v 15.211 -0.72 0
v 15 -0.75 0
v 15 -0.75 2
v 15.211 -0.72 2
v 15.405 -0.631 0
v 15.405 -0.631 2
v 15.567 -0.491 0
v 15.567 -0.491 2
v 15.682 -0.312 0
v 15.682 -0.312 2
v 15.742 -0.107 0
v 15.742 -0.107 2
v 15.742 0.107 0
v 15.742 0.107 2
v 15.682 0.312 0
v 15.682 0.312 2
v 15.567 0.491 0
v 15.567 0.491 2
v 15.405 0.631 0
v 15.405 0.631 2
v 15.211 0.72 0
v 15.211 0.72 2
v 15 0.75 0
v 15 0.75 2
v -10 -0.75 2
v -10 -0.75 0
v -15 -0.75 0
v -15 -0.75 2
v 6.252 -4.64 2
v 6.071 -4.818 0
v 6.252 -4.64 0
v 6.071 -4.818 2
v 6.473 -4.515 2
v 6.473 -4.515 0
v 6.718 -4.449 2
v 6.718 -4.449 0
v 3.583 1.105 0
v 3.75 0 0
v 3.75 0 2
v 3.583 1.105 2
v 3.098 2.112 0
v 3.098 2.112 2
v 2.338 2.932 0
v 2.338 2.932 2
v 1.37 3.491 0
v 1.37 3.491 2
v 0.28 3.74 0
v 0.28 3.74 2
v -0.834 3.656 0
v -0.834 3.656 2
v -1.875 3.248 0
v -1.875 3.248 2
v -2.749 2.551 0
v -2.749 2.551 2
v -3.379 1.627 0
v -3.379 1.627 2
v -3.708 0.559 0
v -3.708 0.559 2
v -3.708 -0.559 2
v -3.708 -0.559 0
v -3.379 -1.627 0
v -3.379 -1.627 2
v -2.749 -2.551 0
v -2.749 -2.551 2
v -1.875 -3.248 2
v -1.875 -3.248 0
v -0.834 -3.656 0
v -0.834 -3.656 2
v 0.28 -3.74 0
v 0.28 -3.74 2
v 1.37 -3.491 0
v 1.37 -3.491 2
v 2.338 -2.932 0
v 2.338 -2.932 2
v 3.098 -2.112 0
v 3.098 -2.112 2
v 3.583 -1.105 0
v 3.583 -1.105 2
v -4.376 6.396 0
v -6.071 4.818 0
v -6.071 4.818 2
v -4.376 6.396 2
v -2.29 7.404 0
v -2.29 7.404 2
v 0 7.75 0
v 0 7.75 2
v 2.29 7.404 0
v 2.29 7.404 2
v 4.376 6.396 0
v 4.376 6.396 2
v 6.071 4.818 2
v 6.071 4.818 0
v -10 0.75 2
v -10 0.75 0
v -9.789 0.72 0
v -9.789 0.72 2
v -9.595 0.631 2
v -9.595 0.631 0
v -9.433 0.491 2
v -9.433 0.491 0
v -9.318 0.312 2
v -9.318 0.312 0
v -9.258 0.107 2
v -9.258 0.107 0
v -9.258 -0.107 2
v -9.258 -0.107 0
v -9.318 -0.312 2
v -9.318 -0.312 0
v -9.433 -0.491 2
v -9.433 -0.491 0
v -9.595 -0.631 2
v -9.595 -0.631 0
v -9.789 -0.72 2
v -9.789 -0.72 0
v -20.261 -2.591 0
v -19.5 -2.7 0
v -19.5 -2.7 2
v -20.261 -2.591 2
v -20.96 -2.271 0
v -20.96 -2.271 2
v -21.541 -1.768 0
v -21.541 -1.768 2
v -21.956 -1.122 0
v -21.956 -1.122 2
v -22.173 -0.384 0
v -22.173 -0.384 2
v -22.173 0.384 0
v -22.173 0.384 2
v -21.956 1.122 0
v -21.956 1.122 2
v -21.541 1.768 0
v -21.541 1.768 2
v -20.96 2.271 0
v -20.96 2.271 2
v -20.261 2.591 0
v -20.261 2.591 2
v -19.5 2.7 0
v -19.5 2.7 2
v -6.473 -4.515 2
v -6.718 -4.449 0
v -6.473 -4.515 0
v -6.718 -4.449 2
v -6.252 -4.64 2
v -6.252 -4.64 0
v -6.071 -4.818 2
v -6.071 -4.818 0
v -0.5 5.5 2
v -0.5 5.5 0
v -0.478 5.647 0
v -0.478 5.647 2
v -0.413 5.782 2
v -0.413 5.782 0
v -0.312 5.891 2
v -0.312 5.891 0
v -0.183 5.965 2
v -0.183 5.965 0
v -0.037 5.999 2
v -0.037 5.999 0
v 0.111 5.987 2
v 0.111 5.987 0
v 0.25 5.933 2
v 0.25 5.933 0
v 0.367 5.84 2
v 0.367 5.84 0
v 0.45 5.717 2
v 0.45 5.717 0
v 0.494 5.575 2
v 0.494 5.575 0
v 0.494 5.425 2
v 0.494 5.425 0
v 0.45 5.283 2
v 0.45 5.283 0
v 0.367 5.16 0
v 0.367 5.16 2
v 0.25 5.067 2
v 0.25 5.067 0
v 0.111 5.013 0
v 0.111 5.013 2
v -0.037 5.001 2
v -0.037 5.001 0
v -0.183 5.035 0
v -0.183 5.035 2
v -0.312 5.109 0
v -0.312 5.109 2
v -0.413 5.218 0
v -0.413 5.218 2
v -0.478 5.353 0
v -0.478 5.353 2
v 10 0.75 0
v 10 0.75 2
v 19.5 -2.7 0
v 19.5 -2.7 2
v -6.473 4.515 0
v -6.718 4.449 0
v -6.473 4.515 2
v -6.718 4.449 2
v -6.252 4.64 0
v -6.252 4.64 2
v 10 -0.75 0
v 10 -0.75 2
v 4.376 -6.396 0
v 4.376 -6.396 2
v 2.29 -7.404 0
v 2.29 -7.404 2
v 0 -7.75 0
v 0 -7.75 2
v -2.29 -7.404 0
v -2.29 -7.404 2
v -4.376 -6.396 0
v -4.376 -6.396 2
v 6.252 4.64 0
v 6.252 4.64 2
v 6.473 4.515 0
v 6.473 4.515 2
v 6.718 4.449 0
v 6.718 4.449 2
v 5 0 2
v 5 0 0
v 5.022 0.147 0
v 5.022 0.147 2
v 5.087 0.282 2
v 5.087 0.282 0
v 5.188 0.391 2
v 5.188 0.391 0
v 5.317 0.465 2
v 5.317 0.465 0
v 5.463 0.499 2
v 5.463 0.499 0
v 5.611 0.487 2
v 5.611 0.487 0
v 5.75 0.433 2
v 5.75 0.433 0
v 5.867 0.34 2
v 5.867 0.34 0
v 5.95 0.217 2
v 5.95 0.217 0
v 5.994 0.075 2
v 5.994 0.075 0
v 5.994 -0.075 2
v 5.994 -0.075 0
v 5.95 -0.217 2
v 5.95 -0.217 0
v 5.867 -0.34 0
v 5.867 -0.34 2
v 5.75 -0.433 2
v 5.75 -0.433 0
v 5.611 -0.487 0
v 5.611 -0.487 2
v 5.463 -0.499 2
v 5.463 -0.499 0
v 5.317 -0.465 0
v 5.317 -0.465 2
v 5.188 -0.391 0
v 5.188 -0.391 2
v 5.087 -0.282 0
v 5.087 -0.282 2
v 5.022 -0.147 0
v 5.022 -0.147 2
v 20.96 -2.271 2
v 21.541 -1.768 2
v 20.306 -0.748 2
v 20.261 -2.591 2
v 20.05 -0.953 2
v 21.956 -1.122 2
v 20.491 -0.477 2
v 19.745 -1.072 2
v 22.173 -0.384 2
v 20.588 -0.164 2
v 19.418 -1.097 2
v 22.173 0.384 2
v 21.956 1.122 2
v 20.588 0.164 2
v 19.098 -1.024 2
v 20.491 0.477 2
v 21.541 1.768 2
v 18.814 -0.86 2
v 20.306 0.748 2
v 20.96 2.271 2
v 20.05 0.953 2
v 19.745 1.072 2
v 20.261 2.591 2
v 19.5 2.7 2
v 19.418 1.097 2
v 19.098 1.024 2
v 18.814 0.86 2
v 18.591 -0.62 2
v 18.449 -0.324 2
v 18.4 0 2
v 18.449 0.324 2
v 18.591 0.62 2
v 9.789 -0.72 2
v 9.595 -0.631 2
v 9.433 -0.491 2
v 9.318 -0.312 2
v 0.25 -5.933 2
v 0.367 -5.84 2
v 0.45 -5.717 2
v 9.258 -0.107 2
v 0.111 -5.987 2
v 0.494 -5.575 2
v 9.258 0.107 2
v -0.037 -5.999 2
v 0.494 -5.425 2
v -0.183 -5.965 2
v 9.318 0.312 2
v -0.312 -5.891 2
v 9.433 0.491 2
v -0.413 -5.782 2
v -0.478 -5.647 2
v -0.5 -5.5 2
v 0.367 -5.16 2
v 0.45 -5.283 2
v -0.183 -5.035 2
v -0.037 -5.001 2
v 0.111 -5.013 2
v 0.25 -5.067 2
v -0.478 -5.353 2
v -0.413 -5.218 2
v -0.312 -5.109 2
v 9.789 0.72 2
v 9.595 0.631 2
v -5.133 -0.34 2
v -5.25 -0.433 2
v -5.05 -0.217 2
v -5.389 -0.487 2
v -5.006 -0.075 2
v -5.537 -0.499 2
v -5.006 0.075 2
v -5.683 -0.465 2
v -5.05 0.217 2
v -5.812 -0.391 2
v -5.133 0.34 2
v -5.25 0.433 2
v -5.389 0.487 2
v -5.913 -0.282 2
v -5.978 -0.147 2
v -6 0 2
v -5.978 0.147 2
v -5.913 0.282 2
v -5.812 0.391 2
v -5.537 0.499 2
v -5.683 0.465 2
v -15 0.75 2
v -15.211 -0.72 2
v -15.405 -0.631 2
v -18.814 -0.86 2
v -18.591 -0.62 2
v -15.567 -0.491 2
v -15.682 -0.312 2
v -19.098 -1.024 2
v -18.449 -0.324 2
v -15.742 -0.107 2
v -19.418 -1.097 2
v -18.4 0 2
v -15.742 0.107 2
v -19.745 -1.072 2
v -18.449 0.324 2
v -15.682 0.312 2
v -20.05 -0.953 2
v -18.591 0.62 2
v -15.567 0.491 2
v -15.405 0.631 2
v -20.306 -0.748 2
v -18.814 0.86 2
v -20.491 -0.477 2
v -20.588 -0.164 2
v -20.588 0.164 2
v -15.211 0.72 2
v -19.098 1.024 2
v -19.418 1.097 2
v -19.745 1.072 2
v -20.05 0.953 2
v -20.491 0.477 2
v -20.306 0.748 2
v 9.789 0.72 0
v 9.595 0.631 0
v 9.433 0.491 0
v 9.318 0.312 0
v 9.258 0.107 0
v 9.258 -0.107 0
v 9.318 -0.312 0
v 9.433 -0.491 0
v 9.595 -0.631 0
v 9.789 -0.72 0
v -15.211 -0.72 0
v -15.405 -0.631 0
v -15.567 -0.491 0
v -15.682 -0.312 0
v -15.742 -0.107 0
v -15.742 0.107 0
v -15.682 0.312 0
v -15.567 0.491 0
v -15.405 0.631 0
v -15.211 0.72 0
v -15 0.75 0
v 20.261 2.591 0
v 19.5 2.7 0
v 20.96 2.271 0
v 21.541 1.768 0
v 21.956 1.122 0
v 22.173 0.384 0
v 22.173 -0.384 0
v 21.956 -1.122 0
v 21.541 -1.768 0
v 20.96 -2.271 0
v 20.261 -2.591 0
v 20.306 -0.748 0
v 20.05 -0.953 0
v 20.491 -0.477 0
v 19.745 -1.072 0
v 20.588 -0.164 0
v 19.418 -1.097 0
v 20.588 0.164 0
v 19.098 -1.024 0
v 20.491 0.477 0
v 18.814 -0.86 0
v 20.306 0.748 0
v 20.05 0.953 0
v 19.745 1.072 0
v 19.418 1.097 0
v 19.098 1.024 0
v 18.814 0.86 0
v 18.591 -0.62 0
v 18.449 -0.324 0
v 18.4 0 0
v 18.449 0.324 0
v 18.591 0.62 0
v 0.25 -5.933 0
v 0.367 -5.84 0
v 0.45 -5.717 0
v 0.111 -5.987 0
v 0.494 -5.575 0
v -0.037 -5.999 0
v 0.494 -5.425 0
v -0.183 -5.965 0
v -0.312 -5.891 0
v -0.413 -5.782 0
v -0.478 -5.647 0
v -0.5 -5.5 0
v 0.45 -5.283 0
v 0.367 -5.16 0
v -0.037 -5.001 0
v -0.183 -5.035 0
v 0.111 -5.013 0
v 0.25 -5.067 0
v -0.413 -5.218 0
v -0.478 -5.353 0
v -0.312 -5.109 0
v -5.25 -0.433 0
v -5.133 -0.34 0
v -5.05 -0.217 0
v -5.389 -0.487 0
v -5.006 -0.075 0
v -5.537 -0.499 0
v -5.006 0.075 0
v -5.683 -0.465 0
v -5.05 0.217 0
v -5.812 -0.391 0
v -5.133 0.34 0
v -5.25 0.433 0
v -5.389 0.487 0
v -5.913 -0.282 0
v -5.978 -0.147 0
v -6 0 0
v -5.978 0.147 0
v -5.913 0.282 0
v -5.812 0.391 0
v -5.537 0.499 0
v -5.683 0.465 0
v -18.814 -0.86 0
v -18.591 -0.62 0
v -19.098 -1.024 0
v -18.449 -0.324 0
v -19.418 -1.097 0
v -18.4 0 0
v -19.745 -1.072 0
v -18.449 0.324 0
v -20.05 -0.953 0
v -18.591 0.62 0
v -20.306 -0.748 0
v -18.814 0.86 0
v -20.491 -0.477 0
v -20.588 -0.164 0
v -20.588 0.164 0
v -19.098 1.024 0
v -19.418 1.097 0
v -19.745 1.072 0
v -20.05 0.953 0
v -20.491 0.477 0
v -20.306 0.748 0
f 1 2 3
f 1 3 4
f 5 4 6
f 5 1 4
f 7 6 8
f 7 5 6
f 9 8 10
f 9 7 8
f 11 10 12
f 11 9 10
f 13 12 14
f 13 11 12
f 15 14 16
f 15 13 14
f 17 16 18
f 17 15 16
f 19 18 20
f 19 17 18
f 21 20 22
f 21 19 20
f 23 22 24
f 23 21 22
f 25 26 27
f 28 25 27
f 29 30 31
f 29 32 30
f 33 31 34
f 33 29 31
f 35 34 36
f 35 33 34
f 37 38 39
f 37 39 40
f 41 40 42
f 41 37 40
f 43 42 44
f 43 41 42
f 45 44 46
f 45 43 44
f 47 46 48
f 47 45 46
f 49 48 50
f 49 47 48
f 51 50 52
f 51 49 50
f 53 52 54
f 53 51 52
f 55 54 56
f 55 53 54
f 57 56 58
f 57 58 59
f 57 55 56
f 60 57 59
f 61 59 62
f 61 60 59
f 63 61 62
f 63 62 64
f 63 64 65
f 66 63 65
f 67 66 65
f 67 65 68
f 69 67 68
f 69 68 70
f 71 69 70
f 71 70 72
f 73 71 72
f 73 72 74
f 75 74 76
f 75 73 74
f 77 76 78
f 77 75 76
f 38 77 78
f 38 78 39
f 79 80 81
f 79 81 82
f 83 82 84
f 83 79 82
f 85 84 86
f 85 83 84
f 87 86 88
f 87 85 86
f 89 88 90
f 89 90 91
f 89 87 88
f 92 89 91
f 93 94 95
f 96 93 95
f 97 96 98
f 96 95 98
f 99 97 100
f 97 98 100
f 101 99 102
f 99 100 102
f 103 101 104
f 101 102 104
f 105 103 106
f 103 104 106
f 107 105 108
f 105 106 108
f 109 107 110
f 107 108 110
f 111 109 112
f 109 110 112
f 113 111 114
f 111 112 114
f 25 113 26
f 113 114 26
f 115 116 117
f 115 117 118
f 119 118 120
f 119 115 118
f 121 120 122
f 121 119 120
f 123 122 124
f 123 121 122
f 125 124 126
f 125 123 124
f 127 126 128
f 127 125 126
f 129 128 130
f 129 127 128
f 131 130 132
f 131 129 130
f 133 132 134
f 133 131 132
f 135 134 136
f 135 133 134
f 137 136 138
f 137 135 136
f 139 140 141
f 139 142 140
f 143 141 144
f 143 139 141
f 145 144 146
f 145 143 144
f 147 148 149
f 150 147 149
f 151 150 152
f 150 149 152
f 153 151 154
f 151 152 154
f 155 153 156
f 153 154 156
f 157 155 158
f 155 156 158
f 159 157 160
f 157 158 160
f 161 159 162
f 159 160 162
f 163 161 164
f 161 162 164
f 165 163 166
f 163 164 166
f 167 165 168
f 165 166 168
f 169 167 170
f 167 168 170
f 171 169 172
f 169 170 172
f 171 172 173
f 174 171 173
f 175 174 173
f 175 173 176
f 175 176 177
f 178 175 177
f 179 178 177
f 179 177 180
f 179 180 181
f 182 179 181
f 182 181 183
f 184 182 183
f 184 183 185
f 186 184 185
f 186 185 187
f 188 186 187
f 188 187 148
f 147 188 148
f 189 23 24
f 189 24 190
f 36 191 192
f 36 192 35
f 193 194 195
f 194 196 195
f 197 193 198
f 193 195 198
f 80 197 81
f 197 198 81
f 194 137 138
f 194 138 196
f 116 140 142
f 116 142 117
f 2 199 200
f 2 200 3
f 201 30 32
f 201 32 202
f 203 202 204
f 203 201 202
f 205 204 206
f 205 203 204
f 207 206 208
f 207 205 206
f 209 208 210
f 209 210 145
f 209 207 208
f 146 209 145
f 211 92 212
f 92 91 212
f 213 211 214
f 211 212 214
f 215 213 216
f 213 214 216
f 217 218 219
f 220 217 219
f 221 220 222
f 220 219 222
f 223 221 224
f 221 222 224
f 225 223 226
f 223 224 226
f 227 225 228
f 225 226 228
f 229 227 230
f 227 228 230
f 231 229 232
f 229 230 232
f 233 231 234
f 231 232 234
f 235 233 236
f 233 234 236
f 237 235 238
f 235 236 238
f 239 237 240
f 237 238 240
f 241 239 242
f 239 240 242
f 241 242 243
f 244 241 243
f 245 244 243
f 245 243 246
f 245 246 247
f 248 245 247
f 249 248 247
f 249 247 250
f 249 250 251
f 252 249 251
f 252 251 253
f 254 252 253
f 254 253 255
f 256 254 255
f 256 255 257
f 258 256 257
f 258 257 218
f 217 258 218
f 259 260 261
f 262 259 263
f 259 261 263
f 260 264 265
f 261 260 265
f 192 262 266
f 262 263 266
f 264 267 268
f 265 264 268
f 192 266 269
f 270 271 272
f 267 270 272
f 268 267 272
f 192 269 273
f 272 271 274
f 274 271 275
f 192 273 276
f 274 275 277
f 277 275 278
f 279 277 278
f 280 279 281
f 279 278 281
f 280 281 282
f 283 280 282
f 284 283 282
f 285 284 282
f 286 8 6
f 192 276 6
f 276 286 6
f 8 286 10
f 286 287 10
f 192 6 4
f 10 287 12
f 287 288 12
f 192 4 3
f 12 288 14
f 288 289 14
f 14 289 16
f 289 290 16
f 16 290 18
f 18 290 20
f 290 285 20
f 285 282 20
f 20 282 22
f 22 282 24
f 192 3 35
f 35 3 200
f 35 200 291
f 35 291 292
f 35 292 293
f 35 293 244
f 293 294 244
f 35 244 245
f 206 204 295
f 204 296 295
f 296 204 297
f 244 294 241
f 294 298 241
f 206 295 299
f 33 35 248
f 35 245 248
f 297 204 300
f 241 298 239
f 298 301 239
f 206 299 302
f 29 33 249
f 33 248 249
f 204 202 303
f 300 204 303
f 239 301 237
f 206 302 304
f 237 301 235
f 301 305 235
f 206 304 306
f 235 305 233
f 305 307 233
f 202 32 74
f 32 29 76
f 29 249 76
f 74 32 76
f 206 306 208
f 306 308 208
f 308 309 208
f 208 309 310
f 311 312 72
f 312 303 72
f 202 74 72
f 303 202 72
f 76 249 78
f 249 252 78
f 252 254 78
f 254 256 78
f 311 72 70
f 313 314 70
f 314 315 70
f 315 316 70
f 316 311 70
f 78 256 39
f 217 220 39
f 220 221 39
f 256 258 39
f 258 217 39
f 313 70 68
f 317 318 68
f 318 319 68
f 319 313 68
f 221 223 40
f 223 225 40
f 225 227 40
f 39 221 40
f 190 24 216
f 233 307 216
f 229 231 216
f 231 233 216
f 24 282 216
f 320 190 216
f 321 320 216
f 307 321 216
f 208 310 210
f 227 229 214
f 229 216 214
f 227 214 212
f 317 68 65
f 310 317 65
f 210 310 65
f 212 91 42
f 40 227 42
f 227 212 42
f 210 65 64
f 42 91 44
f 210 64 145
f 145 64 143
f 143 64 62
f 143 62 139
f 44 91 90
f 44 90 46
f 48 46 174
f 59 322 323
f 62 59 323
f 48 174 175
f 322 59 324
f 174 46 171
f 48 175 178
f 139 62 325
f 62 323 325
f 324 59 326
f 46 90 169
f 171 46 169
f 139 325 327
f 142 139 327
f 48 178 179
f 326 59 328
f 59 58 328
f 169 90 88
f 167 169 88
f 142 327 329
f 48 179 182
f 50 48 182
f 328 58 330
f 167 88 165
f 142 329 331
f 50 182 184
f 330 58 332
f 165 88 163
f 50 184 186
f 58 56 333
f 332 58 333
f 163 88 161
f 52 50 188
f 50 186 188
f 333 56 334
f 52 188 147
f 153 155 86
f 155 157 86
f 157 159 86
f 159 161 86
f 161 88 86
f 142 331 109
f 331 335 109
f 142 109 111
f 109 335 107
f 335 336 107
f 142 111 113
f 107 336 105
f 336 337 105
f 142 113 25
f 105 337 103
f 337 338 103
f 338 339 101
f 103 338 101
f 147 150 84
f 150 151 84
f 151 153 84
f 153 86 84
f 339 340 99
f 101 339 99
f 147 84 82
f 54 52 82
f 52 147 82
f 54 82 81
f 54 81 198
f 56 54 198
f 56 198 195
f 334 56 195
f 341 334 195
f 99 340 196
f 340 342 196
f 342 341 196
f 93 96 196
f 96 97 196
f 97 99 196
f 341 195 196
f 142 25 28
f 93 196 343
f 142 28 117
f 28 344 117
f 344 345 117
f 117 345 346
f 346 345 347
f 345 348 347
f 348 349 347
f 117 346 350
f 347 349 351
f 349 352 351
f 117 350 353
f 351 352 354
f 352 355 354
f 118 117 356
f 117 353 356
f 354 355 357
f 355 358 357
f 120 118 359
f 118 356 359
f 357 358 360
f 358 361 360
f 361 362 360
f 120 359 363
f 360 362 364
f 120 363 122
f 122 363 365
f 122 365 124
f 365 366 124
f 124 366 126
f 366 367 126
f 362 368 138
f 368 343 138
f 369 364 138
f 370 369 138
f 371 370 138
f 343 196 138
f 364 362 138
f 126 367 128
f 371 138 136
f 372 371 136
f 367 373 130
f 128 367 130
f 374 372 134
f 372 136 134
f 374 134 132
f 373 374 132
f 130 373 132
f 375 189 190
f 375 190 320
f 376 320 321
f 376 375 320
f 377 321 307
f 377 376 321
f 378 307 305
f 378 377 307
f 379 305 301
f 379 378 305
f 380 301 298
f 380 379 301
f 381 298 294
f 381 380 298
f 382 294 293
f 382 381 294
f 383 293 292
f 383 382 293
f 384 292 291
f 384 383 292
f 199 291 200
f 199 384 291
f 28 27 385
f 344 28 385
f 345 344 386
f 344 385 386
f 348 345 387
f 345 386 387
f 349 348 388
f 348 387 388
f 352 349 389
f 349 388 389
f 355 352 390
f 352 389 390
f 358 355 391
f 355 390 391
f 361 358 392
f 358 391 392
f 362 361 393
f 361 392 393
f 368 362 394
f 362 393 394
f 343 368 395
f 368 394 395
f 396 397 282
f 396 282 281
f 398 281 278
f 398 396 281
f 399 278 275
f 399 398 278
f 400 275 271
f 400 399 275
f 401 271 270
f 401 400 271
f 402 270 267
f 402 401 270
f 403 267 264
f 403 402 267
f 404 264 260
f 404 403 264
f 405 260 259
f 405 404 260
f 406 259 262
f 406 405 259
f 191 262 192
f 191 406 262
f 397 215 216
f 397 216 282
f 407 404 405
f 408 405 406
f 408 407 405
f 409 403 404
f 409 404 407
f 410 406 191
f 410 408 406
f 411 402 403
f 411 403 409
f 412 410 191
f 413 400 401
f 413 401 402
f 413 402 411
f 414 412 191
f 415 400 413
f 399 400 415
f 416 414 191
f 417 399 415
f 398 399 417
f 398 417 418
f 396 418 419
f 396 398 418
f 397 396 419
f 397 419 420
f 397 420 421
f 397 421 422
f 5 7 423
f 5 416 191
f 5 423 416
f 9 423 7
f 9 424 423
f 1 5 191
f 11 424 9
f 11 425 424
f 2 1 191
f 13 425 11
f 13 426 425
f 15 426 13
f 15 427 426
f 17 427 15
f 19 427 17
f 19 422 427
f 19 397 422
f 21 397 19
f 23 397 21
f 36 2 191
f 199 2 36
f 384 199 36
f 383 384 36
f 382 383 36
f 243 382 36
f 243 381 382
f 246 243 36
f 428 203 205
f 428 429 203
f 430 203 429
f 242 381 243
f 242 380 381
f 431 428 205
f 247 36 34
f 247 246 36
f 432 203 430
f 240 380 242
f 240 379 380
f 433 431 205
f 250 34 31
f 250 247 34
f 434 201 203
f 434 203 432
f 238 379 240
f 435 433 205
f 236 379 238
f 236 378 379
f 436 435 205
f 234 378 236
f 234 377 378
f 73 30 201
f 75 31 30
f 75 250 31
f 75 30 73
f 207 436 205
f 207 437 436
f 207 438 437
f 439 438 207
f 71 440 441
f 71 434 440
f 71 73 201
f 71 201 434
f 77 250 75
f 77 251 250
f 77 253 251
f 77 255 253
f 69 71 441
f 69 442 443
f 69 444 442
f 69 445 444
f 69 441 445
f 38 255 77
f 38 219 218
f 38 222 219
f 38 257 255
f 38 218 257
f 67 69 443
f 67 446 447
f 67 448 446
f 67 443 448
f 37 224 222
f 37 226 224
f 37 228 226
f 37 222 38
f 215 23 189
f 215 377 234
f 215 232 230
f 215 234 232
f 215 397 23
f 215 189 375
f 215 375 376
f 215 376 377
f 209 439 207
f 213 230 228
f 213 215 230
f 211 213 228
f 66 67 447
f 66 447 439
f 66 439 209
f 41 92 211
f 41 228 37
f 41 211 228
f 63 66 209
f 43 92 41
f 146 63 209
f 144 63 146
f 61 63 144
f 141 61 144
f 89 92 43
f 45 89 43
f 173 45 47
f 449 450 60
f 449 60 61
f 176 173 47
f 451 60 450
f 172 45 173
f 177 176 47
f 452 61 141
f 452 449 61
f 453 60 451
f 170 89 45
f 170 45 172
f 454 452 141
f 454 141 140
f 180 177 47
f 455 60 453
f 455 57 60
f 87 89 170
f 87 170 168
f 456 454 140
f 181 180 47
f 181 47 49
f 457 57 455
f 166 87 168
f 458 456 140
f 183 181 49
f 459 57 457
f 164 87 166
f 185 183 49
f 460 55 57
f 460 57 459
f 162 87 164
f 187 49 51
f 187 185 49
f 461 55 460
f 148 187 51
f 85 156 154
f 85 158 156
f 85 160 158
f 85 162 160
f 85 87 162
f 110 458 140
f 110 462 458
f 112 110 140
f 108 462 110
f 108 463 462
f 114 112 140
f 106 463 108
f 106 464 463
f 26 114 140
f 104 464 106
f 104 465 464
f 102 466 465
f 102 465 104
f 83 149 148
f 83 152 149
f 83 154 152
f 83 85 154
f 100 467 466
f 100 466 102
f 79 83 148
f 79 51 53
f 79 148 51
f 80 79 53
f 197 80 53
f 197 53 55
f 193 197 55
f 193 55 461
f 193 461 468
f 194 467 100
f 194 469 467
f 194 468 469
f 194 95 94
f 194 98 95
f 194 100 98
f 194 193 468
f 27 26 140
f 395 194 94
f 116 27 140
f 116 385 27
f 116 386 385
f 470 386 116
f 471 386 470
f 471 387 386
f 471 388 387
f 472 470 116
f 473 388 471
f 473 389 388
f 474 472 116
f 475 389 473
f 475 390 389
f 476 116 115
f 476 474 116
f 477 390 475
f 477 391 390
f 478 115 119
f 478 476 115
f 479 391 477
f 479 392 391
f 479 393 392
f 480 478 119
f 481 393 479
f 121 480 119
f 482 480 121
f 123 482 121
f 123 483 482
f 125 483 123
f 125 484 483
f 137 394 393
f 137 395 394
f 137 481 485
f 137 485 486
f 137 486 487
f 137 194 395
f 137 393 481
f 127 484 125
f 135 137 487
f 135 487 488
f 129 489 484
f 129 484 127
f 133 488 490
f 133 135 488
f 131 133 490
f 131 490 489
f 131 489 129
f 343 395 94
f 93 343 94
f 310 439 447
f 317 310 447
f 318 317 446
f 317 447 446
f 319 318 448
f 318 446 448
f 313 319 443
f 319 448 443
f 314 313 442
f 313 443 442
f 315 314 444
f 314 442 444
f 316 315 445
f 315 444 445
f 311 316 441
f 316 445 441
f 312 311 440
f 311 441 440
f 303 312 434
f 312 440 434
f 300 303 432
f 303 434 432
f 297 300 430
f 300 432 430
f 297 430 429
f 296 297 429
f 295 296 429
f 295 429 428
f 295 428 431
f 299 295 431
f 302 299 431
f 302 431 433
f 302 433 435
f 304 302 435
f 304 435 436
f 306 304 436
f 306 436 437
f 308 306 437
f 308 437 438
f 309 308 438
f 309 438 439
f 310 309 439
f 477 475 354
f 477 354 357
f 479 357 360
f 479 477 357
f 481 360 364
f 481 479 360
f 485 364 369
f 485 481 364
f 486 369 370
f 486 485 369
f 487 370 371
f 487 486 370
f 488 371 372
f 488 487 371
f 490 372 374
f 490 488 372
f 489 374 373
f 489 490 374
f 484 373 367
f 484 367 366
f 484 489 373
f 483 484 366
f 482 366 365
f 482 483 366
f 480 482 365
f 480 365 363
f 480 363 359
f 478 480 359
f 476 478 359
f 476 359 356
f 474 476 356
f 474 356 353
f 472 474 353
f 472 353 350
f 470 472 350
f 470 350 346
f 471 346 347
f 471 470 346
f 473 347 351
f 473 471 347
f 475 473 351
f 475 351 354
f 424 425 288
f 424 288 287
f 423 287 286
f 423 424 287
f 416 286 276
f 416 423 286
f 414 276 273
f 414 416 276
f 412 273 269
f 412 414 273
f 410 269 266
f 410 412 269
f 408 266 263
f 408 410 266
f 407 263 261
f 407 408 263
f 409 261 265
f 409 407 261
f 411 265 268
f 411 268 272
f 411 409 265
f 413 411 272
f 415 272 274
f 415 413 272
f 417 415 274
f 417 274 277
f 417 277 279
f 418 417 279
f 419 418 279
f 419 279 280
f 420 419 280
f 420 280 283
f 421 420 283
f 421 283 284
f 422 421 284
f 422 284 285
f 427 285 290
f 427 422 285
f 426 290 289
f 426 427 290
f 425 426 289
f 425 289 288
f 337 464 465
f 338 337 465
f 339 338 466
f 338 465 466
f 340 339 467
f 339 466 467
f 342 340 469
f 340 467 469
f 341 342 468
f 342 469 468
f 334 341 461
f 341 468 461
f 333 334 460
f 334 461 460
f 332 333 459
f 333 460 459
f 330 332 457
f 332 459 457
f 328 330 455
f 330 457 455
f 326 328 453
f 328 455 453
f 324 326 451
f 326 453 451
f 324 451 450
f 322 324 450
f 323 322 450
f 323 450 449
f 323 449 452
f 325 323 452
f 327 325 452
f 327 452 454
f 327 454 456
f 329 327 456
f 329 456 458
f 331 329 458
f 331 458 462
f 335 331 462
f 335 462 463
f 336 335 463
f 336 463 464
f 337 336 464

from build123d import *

# Parameters (mm, degrees)
SKETCH1_R             = 1.1
SKETCH1_R_2           = 3.75
BOSS_EXTRUDE1_DEPTH   = 2
F_1_0MM_DOWEL_HOLE1_D = 1
FILLET1_R             = 1


with BuildPart() as part:
    # Sketch1 → Boss-Extrude1 (new body)
    with BuildSketch(Plane.XY):
        with BuildLine():
            Line((-19.5, 2.7), (-6.306155873, 4.504985917))
            ThreePointArc((-6.306155873, 4.504985917), (0, 7.75), (6.306155873, 4.504985917))
            Line((6.306155873, 4.504985917), (19.5, 2.7))
            ThreePointArc((19.5, 2.7), (22.2, 0), (19.5, -2.7))
            Line((19.5, -2.7), (6.306155873, -4.504985917))
            ThreePointArc((6.306155873, -4.504985917), (0, -7.75), (-6.306155873, -4.504985917))
            Line((-6.306155873, -4.504985917), (-19.5, -2.7))
            ThreePointArc((-19.5, -2.7), (-22.2, 0), (-19.5, 2.7))
        make_face()
        with Locations((-19.5, 0)):
            Circle(SKETCH1_R, mode=Mode.SUBTRACT)
        with Locations(Location((19.5, 0, 0), (0, 0, 180))):
            Circle(SKETCH1_R, mode=Mode.SUBTRACT)
        Circle(SKETCH1_R_2, mode=Mode.SUBTRACT)
        with BuildLine():
            Line((-10, -0.75), (-15, -0.75))
            ThreePointArc((-15, -0.75), (-15.75, 0), (-15, 0.75))
            Line((-15, 0.75), (-10, 0.75))
            ThreePointArc((-10, 0.75), (-9.25, 0), (-10, -0.75))
        make_face(mode=Mode.SUBTRACT)
        with BuildLine():
            Line((10, -0.75), (15, -0.75))
            ThreePointArc((15, -0.75), (15.75, 0), (15, 0.75))
            Line((15, 0.75), (10, 0.75))
            ThreePointArc((10, 0.75), (9.25, 0), (10, -0.75))
        make_face(mode=Mode.SUBTRACT)
    extrude(amount=BOSS_EXTRUDE1_DEPTH)

    # Ø1.0mm Dowel Hole1 (through all)
    with Locations(Plane.XY.offset(2)):
        with Locations((-5.5, 0), (0, 5.5), (5.5, 0), (0, -5.5)):
            Hole(F_1_0MM_DOWEL_HOLE1_D / 2)

    # Fillet1
    fillet1_edges = [part.edges().sort_by_distance(p)[0] for p in [
        (-6.306155873, 4.504985917, 1),
        (6.306155873, 4.504985917, 1),
        (6.306155873, -4.504985917, 1),
        (-6.306155873, -4.504985917, 1),
    ]]
    fillet(fillet1_edges, radius=FILLET1_R)


solid = part.part
